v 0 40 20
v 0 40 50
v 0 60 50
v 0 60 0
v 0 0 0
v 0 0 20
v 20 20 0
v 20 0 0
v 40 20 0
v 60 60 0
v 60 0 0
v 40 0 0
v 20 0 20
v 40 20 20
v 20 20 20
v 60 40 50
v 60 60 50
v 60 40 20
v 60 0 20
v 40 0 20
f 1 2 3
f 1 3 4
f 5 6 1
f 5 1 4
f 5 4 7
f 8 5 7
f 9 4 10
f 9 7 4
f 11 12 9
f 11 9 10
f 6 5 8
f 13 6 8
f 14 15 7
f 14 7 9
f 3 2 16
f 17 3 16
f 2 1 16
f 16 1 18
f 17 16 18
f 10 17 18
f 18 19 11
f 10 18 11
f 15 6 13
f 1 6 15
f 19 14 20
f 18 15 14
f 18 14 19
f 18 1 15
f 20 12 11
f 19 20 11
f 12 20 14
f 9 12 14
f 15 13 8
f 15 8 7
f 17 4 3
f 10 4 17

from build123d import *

# Parameters (mm, degrees)
ESBO_O1_W                = 60
ESBO_O1_H                = 40
RESSALTO_EXTRUS_O1_DEPTH = 20
ESBO_O8_W                = 20
ESBO_O8_H                = 20
CORTE_EXTRUS_O2_DEPTH    = 40
ESBO_O9_W                = 60
ESBO_O9_H                = 50
RESSALTO_EXTRUS_O2_DEPTH = 20


with BuildPart() as part:
    # Esboço1 → Ressalto-extrusão1 (new body)
    with BuildSketch(Plane.XY):
        with Locations((30, 20)):
            Rectangle(ESBO_O1_W, ESBO_O1_H)
    extrude(amount=RESSALTO_EXTRUS_O1_DEPTH)

    # Esboço8 → Corte-extrusão2 (cut)
    with BuildSketch(Plane.XY.offset(20)):
        with Locations((30, 10)):
            Rectangle(ESBO_O8_W, ESBO_O8_H)
    extrude(amount=-CORTE_EXTRUS_O2_DEPTH, mode=Mode.SUBTRACT)

    # Esboço9 → Ressalto-extrusão2 (add)
    with BuildSketch(Plane(origin=(0, 40, 0), x_dir=(1, 0, 0), z_dir=(0, 1, 0))):
        with Locations((30, -25)):
            Rectangle(ESBO_O9_W, ESBO_O9_H)
    extrude(amount=RESSALTO_EXTRUS_O2_DEPTH)


solid = part.part
